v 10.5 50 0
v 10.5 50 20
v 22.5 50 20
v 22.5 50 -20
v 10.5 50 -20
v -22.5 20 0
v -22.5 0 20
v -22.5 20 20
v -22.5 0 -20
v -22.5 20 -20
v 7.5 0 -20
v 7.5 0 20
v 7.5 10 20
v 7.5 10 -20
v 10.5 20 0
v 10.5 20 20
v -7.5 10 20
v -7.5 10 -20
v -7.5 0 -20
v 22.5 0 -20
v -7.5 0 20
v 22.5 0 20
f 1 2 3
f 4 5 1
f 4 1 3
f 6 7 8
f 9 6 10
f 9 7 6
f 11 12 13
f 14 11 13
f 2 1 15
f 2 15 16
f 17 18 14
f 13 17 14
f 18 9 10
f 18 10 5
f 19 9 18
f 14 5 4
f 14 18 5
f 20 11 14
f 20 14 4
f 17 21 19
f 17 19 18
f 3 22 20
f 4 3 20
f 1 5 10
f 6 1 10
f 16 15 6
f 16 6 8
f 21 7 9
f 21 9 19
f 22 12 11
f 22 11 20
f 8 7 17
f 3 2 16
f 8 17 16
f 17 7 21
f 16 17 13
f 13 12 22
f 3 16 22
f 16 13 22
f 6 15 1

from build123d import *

# Parameters (mm, degrees)
SKETCH1_W                = 45
SKETCH1_H                = 40
BOSS_EXTRUDE1_DEPTH      = 50
SKETCH2_W                = 15
SKETCH2_H                = 10
CUT_EXTRUDE1_DEPTH       = 68.869359802
SKETCH6_W                = 20
SKETCH6_H                = 30
CUT_EXTRUDE15_DEPTH      = 33
CUT_EXTRUDE16_DEPTH      = 59.36308765
CUT_EXTRUDE16_DEPTH_BACK = 20


with BuildPart() as part:
    # Sketch1 → Boss-Extrude1 (new body)
    with BuildSketch(Plane(origin=(0, 0, 0), x_dir=(1, 0, 0), z_dir=(0, 1, 0))):
        Rectangle(SKETCH1_W, SKETCH1_H)
    extrude(amount=BOSS_EXTRUDE1_DEPTH)

    # Sketch2 → Cut-Extrude1 (cut, through all)
    with BuildSketch(Plane.XY.offset(20)):
        with Locations((0, 5)):
            Rectangle(SKETCH2_W, SKETCH2_H)
    extrude(amount=-CUT_EXTRUDE1_DEPTH, mode=Mode.SUBTRACT)

    # Sketch6 → Cut-Extrude15 (cut)
    with BuildSketch(Plane.ZY.offset(22.5)):
        with Locations((10, 35)):
            Rectangle(SKETCH6_W, SKETCH6_H)
    extrude(amount=-CUT_EXTRUDE15_DEPTH, mode=Mode.SUBTRACT)

    # Sketch7 → Cut-Extrude16 (cut, two sides: drawn at the far end of the back side and taken through both)
    with BuildSketch(Plane.XY.offset(-CUT_EXTRUDE16_DEPTH_BACK)):
        Polygon((106.556450077, 137.324045524), (10.5, 50), (-22.5, 20), (-118.556450077, -67.324045524), (-293.204541126, 124.788854629), (-68.091640972, 329.436945678), align=None)
    extrude(amount=CUT_EXTRUDE16_DEPTH + CUT_EXTRUDE16_DEPTH_BACK, mode=Mode.SUBTRACT)


solid = part.part
